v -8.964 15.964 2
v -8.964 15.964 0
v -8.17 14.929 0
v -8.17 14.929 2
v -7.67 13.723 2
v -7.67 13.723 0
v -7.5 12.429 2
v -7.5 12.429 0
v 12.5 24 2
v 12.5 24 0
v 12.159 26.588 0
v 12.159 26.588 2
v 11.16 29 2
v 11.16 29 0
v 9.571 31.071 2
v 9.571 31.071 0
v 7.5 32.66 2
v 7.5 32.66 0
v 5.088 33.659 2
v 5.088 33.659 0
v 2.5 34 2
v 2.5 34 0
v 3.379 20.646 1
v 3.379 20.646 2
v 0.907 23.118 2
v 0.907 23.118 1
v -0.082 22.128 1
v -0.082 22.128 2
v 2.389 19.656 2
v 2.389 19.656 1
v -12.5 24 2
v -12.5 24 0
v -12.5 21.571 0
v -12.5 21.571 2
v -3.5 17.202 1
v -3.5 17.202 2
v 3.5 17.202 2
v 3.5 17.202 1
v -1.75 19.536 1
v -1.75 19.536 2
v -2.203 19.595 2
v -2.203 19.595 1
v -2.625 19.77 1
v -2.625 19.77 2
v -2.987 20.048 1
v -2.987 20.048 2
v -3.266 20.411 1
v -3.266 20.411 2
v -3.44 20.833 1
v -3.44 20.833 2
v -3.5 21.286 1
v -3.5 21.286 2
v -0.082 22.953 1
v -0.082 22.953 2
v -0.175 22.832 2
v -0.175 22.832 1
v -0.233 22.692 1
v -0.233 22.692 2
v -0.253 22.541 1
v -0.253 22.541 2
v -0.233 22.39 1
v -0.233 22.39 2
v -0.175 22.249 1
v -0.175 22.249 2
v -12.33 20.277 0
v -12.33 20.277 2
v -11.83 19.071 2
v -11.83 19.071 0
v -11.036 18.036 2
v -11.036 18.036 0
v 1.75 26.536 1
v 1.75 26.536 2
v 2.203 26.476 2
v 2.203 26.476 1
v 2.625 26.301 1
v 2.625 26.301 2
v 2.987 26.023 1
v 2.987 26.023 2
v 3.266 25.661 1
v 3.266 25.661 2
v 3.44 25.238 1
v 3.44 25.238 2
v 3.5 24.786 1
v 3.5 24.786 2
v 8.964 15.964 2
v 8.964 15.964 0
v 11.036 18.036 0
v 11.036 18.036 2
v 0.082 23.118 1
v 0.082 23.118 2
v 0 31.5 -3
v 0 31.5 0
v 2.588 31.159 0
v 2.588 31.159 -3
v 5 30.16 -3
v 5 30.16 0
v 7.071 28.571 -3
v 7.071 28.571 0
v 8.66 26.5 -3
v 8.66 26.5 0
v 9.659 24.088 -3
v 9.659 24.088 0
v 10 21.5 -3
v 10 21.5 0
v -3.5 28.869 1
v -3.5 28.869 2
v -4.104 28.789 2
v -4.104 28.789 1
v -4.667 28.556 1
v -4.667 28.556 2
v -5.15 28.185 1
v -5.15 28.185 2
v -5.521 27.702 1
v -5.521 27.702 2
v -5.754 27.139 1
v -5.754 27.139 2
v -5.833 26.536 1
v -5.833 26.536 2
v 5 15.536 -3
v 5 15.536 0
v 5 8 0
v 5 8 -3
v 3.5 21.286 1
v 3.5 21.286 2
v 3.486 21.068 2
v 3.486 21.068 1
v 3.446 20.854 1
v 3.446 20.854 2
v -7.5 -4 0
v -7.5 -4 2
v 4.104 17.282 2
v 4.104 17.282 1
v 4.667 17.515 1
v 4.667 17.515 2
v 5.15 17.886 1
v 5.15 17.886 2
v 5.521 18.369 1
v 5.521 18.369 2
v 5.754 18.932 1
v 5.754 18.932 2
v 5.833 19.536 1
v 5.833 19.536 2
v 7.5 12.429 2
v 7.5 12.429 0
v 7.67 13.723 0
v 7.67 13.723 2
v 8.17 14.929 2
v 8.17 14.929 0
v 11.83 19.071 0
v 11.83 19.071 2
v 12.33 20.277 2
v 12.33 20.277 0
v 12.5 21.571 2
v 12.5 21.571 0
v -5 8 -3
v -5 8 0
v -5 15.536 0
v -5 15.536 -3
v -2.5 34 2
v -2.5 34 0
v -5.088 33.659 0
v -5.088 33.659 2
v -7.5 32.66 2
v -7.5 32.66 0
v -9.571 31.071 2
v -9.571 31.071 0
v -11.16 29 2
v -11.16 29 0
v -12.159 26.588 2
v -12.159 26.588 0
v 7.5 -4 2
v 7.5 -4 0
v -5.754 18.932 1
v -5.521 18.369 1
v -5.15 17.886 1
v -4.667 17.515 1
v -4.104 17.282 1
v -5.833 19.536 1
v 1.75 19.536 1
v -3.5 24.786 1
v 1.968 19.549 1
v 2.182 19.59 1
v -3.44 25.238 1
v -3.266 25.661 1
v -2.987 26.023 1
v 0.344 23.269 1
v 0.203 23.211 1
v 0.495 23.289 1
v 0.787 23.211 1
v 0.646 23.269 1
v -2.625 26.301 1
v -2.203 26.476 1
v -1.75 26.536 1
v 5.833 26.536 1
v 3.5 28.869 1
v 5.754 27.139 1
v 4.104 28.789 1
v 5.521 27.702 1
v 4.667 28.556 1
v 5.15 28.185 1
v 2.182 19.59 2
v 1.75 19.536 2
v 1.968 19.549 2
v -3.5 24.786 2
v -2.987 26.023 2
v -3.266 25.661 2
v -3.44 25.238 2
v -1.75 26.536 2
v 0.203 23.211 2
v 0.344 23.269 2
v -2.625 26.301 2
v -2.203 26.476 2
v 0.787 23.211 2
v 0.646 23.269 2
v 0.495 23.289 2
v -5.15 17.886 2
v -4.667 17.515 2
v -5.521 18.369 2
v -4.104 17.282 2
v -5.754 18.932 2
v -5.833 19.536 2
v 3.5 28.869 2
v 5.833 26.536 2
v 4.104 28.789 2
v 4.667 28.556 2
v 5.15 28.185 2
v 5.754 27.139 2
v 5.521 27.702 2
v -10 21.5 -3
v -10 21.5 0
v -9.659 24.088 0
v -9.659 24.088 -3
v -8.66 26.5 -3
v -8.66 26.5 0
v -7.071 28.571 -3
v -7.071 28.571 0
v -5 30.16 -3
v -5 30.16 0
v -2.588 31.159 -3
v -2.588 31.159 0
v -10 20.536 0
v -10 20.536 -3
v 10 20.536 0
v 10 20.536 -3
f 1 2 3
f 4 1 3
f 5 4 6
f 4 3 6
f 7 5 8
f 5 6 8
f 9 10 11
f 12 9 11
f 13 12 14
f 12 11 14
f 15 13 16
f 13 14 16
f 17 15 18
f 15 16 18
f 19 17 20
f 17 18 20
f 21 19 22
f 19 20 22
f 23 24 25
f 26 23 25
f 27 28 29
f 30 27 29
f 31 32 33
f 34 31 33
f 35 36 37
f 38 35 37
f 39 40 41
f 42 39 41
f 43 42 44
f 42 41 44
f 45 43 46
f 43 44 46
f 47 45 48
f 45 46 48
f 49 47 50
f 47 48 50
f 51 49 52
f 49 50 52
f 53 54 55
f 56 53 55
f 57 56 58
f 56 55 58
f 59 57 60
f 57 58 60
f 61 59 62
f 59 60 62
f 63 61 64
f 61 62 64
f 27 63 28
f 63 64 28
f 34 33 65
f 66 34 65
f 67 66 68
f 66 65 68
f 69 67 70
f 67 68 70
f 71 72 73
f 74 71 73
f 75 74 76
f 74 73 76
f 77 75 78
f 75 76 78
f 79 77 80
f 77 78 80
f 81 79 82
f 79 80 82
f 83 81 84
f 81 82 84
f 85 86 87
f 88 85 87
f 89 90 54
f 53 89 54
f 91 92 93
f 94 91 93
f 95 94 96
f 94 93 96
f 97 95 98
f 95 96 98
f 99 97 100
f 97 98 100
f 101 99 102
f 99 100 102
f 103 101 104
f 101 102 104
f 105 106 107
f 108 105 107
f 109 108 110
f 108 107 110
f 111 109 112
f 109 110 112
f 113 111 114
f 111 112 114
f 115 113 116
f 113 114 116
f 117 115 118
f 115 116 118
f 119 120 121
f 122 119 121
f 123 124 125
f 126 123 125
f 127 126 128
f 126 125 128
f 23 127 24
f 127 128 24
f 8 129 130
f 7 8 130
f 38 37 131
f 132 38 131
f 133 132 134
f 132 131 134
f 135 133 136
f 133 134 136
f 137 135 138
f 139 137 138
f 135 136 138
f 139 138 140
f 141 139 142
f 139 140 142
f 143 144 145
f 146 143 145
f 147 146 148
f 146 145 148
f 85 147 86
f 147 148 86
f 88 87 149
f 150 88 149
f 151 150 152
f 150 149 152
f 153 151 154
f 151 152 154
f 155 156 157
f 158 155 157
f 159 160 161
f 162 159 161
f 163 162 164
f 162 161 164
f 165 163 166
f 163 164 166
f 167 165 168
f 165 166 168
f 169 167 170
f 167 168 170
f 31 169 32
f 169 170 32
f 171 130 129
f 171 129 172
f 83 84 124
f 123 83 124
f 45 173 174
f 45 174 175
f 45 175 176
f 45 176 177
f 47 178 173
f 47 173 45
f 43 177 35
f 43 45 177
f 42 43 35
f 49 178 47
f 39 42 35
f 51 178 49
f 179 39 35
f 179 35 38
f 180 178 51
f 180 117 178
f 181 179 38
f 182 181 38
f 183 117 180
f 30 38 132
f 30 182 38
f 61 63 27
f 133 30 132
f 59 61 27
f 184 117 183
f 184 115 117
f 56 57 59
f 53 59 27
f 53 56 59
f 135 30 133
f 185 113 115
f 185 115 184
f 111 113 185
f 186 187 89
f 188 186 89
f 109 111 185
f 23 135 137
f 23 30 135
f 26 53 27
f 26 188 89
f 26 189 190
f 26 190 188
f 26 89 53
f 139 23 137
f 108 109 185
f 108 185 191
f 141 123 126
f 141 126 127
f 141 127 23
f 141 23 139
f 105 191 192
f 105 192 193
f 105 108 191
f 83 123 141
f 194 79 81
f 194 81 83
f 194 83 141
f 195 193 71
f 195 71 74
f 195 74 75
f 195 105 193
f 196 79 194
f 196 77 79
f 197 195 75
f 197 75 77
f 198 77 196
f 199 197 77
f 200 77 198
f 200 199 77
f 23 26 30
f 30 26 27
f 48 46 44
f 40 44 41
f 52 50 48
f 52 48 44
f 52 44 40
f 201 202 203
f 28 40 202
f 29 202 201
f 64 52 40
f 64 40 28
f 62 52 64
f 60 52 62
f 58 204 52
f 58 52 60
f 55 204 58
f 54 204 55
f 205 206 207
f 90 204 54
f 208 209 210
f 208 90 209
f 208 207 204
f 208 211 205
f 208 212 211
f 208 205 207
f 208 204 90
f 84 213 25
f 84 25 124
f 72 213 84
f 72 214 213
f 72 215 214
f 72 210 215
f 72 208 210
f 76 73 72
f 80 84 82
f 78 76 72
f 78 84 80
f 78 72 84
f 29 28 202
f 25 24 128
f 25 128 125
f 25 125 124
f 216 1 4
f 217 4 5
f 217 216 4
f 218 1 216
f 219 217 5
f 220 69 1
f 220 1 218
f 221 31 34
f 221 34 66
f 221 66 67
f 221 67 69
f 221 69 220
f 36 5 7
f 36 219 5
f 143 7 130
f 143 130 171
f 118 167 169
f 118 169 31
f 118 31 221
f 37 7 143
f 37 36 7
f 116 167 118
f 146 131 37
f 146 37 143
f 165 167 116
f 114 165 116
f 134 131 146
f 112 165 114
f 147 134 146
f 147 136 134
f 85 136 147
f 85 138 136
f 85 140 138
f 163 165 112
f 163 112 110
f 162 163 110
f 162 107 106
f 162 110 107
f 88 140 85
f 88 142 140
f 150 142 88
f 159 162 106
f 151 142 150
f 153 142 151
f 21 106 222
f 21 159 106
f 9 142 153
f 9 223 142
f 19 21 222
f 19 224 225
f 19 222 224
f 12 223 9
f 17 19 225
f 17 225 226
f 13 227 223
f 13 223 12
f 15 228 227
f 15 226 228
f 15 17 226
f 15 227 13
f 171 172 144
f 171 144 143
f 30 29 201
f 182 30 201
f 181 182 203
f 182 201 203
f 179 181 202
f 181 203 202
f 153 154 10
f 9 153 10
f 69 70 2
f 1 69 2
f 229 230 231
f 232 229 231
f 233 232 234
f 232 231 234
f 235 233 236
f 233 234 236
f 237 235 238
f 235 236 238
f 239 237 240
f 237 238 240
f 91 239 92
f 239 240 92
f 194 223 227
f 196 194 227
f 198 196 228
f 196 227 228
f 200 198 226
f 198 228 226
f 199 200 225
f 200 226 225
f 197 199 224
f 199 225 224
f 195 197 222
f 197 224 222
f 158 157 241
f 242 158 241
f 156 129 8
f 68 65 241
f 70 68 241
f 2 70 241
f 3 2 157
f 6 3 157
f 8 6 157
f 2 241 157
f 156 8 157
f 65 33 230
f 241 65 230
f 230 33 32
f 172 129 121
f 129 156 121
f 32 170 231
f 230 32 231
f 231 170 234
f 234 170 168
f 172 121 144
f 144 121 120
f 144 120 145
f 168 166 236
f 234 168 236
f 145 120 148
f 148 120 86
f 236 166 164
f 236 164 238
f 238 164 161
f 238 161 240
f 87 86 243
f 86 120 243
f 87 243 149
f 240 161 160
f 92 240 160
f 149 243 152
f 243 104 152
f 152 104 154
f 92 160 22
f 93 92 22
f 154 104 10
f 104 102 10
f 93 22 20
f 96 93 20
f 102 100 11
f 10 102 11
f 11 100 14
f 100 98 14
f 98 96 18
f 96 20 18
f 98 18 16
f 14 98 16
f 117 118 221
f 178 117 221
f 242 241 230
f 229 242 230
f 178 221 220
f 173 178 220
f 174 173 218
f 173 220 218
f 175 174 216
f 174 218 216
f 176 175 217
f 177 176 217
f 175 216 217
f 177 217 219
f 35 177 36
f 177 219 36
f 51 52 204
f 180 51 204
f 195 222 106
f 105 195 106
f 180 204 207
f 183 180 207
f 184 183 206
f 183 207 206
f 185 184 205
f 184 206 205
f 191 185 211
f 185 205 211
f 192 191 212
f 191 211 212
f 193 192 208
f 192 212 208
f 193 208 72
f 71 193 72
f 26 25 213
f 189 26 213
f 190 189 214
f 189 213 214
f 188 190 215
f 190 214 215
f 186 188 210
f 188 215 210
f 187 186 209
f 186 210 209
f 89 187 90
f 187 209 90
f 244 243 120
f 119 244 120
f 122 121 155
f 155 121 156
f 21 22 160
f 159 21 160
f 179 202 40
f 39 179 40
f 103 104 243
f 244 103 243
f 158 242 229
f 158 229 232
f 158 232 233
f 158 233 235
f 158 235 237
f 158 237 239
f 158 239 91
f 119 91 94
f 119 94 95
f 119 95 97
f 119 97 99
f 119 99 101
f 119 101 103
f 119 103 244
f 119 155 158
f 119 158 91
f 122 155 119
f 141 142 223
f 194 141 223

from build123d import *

# Parameters (mm, degrees)
F1_DEPTH = 2
F3_DEPTH = 3
F4_W     = 15
F4_H     = 2
F5_DEPTH = 4
F7_DEPTH = 1


with BuildPart() as f1:
    # F0 (on Top) → F1 (new body)
    with BuildSketch(Plane.XY):
        with BuildLine():
            Line((-7.5, 0), (0, 0))
            Line((0, 0), (7.5, 0))
            Line((7.5, 0), (7.5, 12.428932))
            ThreePointArc((7.5, 12.428932), (7.880602, 14.342349), (8.964466, 15.964466))
            Line((8.964466, 15.964466), (11.035534, 18.035534))
            ThreePointArc((11.035534, 18.035534), (12.119398, 19.657651), (12.5, 21.571068))
            Line((12.5, 21.571068), (12.5, 24))
            ThreePointArc((12.5, 24), (9.571068, 31.071068), (2.5, 34))
            Line((2.5, 34), (0, 34))
            Line((0, 34), (-2.5, 34))
            ThreePointArc((-2.5, 34), (-9.571068, 31.071068), (-12.5, 24))
            Line((-12.5, 24), (-12.5, 21.571068))
            ThreePointArc((-12.5, 21.571068), (-12.119398, 19.657651), (-11.035534, 18.035534))
            Line((-11.035534, 18.035534), (-8.964466, 15.964466))
            ThreePointArc((-8.964466, 15.964466), (-7.880602, 14.342349), (-7.5, 12.428932))
            Line((-7.5, 12.428932), (-7.5, 0))
        make_face()
    extrude(amount=F1_DEPTH)

    # F2 (on face) → F3 (join)
    with BuildSketch(Plane(origin=(0, 0, 0), x_dir=(1, 0, 0), z_dir=(0, 0, -1))):
        with BuildLine():
            ThreePointArc((0, -31.5), (7.071068, -28.571068), (10, -21.5))
            Line((10, -21.5), (10, -20.535534))
            Line((10, -20.535534), (5, -15.535534))
            Line((5, -15.535534), (5, -8))
            Line((5, -8), (-5, -8))
            Line((-5, -8), (-5, -15.535534))
            Line((-5, -15.535534), (-10, -20.535534))
            Line((-10, -20.535534), (-10, -21.5))
            ThreePointArc((-10, -21.5), (-7.071068, -28.571068), (0, -31.5))
        make_face()
    extrude(amount=F3_DEPTH)

    # F4 (on face) → F5 (join)
    with BuildSketch(Plane.XZ):
        with Locations((0, 1)):
            Rectangle(F4_W, F4_H)
    extrude(amount=F5_DEPTH)

    # F6 (on face) → F7 (cut)
    with BuildSketch(Plane.XY.offset(2)):
        with BuildLine():
            ThreePointArc((-5.833333, 19.535534), (-5.149916, 17.885618), (-3.5, 17.202201))
            Line((-3.5, 17.202201), (3.5, 17.202201))
            ThreePointArc((3.5, 17.202201), (5.149916, 17.885618), (5.833333, 19.535534))
            Line((5.833333, 19.535534), (5.833333, 26.535534))
            ThreePointArc((5.833333, 26.535534), (5.149916, 28.18545), (3.5, 28.868867))
            Line((3.5, 28.868867), (-3.5, 28.868867))
            ThreePointArc((-3.5, 28.868867), (-5.149916, 28.18545), (-5.833333, 26.535534))
            Line((-5.833333, 26.535534), (-5.833333, 19.535534))
        make_face()
        with BuildLine():
            Line((1.75, 19.535534), (-1.75, 19.535534))
            ThreePointArc((-1.75, 19.535534), (-2.987437, 20.048097), (-3.5, 21.285534))
            Line((-3.5, 21.285534), (-3.5, 24.785534))
            ThreePointArc((-3.5, 24.785534), (-2.987437, 26.022971), (-1.75, 26.535534))
            Line((-1.75, 26.535534), (1.75, 26.535534))
            ThreePointArc((1.75, 26.535534), (2.987437, 26.022971), (3.5, 24.785534))
            Line((3.5, 24.785534), (3.5, 21.285534))
            ThreePointArc((3.5, 21.285534), (3.46951, 20.96029), (3.379104, 20.646379))
            Line((3.379104, 20.646379), (0.907454, 23.11803))
            ThreePointArc((0.907454, 23.11803), (0.494975, 23.288884), (0.082496, 23.11803))
            Line((0.082496, 23.11803), (0, 23.035534))
            Line((0, 23.035534), (-0.082496, 22.953038))
            ThreePointArc((-0.082496, 22.953038), (-0.25335, 22.540559), (-0.082496, 22.12808))
            Line((-0.082496, 22.12808), (2.389155, 19.65643))
            ThreePointArc((2.389155, 19.65643), (2.075244, 19.566023), (1.75, 19.535534))
        make_face(mode=Mode.SUBTRACT)
    extrude(amount=-F7_DEPTH, mode=Mode.SUBTRACT)


solid = f1.part
